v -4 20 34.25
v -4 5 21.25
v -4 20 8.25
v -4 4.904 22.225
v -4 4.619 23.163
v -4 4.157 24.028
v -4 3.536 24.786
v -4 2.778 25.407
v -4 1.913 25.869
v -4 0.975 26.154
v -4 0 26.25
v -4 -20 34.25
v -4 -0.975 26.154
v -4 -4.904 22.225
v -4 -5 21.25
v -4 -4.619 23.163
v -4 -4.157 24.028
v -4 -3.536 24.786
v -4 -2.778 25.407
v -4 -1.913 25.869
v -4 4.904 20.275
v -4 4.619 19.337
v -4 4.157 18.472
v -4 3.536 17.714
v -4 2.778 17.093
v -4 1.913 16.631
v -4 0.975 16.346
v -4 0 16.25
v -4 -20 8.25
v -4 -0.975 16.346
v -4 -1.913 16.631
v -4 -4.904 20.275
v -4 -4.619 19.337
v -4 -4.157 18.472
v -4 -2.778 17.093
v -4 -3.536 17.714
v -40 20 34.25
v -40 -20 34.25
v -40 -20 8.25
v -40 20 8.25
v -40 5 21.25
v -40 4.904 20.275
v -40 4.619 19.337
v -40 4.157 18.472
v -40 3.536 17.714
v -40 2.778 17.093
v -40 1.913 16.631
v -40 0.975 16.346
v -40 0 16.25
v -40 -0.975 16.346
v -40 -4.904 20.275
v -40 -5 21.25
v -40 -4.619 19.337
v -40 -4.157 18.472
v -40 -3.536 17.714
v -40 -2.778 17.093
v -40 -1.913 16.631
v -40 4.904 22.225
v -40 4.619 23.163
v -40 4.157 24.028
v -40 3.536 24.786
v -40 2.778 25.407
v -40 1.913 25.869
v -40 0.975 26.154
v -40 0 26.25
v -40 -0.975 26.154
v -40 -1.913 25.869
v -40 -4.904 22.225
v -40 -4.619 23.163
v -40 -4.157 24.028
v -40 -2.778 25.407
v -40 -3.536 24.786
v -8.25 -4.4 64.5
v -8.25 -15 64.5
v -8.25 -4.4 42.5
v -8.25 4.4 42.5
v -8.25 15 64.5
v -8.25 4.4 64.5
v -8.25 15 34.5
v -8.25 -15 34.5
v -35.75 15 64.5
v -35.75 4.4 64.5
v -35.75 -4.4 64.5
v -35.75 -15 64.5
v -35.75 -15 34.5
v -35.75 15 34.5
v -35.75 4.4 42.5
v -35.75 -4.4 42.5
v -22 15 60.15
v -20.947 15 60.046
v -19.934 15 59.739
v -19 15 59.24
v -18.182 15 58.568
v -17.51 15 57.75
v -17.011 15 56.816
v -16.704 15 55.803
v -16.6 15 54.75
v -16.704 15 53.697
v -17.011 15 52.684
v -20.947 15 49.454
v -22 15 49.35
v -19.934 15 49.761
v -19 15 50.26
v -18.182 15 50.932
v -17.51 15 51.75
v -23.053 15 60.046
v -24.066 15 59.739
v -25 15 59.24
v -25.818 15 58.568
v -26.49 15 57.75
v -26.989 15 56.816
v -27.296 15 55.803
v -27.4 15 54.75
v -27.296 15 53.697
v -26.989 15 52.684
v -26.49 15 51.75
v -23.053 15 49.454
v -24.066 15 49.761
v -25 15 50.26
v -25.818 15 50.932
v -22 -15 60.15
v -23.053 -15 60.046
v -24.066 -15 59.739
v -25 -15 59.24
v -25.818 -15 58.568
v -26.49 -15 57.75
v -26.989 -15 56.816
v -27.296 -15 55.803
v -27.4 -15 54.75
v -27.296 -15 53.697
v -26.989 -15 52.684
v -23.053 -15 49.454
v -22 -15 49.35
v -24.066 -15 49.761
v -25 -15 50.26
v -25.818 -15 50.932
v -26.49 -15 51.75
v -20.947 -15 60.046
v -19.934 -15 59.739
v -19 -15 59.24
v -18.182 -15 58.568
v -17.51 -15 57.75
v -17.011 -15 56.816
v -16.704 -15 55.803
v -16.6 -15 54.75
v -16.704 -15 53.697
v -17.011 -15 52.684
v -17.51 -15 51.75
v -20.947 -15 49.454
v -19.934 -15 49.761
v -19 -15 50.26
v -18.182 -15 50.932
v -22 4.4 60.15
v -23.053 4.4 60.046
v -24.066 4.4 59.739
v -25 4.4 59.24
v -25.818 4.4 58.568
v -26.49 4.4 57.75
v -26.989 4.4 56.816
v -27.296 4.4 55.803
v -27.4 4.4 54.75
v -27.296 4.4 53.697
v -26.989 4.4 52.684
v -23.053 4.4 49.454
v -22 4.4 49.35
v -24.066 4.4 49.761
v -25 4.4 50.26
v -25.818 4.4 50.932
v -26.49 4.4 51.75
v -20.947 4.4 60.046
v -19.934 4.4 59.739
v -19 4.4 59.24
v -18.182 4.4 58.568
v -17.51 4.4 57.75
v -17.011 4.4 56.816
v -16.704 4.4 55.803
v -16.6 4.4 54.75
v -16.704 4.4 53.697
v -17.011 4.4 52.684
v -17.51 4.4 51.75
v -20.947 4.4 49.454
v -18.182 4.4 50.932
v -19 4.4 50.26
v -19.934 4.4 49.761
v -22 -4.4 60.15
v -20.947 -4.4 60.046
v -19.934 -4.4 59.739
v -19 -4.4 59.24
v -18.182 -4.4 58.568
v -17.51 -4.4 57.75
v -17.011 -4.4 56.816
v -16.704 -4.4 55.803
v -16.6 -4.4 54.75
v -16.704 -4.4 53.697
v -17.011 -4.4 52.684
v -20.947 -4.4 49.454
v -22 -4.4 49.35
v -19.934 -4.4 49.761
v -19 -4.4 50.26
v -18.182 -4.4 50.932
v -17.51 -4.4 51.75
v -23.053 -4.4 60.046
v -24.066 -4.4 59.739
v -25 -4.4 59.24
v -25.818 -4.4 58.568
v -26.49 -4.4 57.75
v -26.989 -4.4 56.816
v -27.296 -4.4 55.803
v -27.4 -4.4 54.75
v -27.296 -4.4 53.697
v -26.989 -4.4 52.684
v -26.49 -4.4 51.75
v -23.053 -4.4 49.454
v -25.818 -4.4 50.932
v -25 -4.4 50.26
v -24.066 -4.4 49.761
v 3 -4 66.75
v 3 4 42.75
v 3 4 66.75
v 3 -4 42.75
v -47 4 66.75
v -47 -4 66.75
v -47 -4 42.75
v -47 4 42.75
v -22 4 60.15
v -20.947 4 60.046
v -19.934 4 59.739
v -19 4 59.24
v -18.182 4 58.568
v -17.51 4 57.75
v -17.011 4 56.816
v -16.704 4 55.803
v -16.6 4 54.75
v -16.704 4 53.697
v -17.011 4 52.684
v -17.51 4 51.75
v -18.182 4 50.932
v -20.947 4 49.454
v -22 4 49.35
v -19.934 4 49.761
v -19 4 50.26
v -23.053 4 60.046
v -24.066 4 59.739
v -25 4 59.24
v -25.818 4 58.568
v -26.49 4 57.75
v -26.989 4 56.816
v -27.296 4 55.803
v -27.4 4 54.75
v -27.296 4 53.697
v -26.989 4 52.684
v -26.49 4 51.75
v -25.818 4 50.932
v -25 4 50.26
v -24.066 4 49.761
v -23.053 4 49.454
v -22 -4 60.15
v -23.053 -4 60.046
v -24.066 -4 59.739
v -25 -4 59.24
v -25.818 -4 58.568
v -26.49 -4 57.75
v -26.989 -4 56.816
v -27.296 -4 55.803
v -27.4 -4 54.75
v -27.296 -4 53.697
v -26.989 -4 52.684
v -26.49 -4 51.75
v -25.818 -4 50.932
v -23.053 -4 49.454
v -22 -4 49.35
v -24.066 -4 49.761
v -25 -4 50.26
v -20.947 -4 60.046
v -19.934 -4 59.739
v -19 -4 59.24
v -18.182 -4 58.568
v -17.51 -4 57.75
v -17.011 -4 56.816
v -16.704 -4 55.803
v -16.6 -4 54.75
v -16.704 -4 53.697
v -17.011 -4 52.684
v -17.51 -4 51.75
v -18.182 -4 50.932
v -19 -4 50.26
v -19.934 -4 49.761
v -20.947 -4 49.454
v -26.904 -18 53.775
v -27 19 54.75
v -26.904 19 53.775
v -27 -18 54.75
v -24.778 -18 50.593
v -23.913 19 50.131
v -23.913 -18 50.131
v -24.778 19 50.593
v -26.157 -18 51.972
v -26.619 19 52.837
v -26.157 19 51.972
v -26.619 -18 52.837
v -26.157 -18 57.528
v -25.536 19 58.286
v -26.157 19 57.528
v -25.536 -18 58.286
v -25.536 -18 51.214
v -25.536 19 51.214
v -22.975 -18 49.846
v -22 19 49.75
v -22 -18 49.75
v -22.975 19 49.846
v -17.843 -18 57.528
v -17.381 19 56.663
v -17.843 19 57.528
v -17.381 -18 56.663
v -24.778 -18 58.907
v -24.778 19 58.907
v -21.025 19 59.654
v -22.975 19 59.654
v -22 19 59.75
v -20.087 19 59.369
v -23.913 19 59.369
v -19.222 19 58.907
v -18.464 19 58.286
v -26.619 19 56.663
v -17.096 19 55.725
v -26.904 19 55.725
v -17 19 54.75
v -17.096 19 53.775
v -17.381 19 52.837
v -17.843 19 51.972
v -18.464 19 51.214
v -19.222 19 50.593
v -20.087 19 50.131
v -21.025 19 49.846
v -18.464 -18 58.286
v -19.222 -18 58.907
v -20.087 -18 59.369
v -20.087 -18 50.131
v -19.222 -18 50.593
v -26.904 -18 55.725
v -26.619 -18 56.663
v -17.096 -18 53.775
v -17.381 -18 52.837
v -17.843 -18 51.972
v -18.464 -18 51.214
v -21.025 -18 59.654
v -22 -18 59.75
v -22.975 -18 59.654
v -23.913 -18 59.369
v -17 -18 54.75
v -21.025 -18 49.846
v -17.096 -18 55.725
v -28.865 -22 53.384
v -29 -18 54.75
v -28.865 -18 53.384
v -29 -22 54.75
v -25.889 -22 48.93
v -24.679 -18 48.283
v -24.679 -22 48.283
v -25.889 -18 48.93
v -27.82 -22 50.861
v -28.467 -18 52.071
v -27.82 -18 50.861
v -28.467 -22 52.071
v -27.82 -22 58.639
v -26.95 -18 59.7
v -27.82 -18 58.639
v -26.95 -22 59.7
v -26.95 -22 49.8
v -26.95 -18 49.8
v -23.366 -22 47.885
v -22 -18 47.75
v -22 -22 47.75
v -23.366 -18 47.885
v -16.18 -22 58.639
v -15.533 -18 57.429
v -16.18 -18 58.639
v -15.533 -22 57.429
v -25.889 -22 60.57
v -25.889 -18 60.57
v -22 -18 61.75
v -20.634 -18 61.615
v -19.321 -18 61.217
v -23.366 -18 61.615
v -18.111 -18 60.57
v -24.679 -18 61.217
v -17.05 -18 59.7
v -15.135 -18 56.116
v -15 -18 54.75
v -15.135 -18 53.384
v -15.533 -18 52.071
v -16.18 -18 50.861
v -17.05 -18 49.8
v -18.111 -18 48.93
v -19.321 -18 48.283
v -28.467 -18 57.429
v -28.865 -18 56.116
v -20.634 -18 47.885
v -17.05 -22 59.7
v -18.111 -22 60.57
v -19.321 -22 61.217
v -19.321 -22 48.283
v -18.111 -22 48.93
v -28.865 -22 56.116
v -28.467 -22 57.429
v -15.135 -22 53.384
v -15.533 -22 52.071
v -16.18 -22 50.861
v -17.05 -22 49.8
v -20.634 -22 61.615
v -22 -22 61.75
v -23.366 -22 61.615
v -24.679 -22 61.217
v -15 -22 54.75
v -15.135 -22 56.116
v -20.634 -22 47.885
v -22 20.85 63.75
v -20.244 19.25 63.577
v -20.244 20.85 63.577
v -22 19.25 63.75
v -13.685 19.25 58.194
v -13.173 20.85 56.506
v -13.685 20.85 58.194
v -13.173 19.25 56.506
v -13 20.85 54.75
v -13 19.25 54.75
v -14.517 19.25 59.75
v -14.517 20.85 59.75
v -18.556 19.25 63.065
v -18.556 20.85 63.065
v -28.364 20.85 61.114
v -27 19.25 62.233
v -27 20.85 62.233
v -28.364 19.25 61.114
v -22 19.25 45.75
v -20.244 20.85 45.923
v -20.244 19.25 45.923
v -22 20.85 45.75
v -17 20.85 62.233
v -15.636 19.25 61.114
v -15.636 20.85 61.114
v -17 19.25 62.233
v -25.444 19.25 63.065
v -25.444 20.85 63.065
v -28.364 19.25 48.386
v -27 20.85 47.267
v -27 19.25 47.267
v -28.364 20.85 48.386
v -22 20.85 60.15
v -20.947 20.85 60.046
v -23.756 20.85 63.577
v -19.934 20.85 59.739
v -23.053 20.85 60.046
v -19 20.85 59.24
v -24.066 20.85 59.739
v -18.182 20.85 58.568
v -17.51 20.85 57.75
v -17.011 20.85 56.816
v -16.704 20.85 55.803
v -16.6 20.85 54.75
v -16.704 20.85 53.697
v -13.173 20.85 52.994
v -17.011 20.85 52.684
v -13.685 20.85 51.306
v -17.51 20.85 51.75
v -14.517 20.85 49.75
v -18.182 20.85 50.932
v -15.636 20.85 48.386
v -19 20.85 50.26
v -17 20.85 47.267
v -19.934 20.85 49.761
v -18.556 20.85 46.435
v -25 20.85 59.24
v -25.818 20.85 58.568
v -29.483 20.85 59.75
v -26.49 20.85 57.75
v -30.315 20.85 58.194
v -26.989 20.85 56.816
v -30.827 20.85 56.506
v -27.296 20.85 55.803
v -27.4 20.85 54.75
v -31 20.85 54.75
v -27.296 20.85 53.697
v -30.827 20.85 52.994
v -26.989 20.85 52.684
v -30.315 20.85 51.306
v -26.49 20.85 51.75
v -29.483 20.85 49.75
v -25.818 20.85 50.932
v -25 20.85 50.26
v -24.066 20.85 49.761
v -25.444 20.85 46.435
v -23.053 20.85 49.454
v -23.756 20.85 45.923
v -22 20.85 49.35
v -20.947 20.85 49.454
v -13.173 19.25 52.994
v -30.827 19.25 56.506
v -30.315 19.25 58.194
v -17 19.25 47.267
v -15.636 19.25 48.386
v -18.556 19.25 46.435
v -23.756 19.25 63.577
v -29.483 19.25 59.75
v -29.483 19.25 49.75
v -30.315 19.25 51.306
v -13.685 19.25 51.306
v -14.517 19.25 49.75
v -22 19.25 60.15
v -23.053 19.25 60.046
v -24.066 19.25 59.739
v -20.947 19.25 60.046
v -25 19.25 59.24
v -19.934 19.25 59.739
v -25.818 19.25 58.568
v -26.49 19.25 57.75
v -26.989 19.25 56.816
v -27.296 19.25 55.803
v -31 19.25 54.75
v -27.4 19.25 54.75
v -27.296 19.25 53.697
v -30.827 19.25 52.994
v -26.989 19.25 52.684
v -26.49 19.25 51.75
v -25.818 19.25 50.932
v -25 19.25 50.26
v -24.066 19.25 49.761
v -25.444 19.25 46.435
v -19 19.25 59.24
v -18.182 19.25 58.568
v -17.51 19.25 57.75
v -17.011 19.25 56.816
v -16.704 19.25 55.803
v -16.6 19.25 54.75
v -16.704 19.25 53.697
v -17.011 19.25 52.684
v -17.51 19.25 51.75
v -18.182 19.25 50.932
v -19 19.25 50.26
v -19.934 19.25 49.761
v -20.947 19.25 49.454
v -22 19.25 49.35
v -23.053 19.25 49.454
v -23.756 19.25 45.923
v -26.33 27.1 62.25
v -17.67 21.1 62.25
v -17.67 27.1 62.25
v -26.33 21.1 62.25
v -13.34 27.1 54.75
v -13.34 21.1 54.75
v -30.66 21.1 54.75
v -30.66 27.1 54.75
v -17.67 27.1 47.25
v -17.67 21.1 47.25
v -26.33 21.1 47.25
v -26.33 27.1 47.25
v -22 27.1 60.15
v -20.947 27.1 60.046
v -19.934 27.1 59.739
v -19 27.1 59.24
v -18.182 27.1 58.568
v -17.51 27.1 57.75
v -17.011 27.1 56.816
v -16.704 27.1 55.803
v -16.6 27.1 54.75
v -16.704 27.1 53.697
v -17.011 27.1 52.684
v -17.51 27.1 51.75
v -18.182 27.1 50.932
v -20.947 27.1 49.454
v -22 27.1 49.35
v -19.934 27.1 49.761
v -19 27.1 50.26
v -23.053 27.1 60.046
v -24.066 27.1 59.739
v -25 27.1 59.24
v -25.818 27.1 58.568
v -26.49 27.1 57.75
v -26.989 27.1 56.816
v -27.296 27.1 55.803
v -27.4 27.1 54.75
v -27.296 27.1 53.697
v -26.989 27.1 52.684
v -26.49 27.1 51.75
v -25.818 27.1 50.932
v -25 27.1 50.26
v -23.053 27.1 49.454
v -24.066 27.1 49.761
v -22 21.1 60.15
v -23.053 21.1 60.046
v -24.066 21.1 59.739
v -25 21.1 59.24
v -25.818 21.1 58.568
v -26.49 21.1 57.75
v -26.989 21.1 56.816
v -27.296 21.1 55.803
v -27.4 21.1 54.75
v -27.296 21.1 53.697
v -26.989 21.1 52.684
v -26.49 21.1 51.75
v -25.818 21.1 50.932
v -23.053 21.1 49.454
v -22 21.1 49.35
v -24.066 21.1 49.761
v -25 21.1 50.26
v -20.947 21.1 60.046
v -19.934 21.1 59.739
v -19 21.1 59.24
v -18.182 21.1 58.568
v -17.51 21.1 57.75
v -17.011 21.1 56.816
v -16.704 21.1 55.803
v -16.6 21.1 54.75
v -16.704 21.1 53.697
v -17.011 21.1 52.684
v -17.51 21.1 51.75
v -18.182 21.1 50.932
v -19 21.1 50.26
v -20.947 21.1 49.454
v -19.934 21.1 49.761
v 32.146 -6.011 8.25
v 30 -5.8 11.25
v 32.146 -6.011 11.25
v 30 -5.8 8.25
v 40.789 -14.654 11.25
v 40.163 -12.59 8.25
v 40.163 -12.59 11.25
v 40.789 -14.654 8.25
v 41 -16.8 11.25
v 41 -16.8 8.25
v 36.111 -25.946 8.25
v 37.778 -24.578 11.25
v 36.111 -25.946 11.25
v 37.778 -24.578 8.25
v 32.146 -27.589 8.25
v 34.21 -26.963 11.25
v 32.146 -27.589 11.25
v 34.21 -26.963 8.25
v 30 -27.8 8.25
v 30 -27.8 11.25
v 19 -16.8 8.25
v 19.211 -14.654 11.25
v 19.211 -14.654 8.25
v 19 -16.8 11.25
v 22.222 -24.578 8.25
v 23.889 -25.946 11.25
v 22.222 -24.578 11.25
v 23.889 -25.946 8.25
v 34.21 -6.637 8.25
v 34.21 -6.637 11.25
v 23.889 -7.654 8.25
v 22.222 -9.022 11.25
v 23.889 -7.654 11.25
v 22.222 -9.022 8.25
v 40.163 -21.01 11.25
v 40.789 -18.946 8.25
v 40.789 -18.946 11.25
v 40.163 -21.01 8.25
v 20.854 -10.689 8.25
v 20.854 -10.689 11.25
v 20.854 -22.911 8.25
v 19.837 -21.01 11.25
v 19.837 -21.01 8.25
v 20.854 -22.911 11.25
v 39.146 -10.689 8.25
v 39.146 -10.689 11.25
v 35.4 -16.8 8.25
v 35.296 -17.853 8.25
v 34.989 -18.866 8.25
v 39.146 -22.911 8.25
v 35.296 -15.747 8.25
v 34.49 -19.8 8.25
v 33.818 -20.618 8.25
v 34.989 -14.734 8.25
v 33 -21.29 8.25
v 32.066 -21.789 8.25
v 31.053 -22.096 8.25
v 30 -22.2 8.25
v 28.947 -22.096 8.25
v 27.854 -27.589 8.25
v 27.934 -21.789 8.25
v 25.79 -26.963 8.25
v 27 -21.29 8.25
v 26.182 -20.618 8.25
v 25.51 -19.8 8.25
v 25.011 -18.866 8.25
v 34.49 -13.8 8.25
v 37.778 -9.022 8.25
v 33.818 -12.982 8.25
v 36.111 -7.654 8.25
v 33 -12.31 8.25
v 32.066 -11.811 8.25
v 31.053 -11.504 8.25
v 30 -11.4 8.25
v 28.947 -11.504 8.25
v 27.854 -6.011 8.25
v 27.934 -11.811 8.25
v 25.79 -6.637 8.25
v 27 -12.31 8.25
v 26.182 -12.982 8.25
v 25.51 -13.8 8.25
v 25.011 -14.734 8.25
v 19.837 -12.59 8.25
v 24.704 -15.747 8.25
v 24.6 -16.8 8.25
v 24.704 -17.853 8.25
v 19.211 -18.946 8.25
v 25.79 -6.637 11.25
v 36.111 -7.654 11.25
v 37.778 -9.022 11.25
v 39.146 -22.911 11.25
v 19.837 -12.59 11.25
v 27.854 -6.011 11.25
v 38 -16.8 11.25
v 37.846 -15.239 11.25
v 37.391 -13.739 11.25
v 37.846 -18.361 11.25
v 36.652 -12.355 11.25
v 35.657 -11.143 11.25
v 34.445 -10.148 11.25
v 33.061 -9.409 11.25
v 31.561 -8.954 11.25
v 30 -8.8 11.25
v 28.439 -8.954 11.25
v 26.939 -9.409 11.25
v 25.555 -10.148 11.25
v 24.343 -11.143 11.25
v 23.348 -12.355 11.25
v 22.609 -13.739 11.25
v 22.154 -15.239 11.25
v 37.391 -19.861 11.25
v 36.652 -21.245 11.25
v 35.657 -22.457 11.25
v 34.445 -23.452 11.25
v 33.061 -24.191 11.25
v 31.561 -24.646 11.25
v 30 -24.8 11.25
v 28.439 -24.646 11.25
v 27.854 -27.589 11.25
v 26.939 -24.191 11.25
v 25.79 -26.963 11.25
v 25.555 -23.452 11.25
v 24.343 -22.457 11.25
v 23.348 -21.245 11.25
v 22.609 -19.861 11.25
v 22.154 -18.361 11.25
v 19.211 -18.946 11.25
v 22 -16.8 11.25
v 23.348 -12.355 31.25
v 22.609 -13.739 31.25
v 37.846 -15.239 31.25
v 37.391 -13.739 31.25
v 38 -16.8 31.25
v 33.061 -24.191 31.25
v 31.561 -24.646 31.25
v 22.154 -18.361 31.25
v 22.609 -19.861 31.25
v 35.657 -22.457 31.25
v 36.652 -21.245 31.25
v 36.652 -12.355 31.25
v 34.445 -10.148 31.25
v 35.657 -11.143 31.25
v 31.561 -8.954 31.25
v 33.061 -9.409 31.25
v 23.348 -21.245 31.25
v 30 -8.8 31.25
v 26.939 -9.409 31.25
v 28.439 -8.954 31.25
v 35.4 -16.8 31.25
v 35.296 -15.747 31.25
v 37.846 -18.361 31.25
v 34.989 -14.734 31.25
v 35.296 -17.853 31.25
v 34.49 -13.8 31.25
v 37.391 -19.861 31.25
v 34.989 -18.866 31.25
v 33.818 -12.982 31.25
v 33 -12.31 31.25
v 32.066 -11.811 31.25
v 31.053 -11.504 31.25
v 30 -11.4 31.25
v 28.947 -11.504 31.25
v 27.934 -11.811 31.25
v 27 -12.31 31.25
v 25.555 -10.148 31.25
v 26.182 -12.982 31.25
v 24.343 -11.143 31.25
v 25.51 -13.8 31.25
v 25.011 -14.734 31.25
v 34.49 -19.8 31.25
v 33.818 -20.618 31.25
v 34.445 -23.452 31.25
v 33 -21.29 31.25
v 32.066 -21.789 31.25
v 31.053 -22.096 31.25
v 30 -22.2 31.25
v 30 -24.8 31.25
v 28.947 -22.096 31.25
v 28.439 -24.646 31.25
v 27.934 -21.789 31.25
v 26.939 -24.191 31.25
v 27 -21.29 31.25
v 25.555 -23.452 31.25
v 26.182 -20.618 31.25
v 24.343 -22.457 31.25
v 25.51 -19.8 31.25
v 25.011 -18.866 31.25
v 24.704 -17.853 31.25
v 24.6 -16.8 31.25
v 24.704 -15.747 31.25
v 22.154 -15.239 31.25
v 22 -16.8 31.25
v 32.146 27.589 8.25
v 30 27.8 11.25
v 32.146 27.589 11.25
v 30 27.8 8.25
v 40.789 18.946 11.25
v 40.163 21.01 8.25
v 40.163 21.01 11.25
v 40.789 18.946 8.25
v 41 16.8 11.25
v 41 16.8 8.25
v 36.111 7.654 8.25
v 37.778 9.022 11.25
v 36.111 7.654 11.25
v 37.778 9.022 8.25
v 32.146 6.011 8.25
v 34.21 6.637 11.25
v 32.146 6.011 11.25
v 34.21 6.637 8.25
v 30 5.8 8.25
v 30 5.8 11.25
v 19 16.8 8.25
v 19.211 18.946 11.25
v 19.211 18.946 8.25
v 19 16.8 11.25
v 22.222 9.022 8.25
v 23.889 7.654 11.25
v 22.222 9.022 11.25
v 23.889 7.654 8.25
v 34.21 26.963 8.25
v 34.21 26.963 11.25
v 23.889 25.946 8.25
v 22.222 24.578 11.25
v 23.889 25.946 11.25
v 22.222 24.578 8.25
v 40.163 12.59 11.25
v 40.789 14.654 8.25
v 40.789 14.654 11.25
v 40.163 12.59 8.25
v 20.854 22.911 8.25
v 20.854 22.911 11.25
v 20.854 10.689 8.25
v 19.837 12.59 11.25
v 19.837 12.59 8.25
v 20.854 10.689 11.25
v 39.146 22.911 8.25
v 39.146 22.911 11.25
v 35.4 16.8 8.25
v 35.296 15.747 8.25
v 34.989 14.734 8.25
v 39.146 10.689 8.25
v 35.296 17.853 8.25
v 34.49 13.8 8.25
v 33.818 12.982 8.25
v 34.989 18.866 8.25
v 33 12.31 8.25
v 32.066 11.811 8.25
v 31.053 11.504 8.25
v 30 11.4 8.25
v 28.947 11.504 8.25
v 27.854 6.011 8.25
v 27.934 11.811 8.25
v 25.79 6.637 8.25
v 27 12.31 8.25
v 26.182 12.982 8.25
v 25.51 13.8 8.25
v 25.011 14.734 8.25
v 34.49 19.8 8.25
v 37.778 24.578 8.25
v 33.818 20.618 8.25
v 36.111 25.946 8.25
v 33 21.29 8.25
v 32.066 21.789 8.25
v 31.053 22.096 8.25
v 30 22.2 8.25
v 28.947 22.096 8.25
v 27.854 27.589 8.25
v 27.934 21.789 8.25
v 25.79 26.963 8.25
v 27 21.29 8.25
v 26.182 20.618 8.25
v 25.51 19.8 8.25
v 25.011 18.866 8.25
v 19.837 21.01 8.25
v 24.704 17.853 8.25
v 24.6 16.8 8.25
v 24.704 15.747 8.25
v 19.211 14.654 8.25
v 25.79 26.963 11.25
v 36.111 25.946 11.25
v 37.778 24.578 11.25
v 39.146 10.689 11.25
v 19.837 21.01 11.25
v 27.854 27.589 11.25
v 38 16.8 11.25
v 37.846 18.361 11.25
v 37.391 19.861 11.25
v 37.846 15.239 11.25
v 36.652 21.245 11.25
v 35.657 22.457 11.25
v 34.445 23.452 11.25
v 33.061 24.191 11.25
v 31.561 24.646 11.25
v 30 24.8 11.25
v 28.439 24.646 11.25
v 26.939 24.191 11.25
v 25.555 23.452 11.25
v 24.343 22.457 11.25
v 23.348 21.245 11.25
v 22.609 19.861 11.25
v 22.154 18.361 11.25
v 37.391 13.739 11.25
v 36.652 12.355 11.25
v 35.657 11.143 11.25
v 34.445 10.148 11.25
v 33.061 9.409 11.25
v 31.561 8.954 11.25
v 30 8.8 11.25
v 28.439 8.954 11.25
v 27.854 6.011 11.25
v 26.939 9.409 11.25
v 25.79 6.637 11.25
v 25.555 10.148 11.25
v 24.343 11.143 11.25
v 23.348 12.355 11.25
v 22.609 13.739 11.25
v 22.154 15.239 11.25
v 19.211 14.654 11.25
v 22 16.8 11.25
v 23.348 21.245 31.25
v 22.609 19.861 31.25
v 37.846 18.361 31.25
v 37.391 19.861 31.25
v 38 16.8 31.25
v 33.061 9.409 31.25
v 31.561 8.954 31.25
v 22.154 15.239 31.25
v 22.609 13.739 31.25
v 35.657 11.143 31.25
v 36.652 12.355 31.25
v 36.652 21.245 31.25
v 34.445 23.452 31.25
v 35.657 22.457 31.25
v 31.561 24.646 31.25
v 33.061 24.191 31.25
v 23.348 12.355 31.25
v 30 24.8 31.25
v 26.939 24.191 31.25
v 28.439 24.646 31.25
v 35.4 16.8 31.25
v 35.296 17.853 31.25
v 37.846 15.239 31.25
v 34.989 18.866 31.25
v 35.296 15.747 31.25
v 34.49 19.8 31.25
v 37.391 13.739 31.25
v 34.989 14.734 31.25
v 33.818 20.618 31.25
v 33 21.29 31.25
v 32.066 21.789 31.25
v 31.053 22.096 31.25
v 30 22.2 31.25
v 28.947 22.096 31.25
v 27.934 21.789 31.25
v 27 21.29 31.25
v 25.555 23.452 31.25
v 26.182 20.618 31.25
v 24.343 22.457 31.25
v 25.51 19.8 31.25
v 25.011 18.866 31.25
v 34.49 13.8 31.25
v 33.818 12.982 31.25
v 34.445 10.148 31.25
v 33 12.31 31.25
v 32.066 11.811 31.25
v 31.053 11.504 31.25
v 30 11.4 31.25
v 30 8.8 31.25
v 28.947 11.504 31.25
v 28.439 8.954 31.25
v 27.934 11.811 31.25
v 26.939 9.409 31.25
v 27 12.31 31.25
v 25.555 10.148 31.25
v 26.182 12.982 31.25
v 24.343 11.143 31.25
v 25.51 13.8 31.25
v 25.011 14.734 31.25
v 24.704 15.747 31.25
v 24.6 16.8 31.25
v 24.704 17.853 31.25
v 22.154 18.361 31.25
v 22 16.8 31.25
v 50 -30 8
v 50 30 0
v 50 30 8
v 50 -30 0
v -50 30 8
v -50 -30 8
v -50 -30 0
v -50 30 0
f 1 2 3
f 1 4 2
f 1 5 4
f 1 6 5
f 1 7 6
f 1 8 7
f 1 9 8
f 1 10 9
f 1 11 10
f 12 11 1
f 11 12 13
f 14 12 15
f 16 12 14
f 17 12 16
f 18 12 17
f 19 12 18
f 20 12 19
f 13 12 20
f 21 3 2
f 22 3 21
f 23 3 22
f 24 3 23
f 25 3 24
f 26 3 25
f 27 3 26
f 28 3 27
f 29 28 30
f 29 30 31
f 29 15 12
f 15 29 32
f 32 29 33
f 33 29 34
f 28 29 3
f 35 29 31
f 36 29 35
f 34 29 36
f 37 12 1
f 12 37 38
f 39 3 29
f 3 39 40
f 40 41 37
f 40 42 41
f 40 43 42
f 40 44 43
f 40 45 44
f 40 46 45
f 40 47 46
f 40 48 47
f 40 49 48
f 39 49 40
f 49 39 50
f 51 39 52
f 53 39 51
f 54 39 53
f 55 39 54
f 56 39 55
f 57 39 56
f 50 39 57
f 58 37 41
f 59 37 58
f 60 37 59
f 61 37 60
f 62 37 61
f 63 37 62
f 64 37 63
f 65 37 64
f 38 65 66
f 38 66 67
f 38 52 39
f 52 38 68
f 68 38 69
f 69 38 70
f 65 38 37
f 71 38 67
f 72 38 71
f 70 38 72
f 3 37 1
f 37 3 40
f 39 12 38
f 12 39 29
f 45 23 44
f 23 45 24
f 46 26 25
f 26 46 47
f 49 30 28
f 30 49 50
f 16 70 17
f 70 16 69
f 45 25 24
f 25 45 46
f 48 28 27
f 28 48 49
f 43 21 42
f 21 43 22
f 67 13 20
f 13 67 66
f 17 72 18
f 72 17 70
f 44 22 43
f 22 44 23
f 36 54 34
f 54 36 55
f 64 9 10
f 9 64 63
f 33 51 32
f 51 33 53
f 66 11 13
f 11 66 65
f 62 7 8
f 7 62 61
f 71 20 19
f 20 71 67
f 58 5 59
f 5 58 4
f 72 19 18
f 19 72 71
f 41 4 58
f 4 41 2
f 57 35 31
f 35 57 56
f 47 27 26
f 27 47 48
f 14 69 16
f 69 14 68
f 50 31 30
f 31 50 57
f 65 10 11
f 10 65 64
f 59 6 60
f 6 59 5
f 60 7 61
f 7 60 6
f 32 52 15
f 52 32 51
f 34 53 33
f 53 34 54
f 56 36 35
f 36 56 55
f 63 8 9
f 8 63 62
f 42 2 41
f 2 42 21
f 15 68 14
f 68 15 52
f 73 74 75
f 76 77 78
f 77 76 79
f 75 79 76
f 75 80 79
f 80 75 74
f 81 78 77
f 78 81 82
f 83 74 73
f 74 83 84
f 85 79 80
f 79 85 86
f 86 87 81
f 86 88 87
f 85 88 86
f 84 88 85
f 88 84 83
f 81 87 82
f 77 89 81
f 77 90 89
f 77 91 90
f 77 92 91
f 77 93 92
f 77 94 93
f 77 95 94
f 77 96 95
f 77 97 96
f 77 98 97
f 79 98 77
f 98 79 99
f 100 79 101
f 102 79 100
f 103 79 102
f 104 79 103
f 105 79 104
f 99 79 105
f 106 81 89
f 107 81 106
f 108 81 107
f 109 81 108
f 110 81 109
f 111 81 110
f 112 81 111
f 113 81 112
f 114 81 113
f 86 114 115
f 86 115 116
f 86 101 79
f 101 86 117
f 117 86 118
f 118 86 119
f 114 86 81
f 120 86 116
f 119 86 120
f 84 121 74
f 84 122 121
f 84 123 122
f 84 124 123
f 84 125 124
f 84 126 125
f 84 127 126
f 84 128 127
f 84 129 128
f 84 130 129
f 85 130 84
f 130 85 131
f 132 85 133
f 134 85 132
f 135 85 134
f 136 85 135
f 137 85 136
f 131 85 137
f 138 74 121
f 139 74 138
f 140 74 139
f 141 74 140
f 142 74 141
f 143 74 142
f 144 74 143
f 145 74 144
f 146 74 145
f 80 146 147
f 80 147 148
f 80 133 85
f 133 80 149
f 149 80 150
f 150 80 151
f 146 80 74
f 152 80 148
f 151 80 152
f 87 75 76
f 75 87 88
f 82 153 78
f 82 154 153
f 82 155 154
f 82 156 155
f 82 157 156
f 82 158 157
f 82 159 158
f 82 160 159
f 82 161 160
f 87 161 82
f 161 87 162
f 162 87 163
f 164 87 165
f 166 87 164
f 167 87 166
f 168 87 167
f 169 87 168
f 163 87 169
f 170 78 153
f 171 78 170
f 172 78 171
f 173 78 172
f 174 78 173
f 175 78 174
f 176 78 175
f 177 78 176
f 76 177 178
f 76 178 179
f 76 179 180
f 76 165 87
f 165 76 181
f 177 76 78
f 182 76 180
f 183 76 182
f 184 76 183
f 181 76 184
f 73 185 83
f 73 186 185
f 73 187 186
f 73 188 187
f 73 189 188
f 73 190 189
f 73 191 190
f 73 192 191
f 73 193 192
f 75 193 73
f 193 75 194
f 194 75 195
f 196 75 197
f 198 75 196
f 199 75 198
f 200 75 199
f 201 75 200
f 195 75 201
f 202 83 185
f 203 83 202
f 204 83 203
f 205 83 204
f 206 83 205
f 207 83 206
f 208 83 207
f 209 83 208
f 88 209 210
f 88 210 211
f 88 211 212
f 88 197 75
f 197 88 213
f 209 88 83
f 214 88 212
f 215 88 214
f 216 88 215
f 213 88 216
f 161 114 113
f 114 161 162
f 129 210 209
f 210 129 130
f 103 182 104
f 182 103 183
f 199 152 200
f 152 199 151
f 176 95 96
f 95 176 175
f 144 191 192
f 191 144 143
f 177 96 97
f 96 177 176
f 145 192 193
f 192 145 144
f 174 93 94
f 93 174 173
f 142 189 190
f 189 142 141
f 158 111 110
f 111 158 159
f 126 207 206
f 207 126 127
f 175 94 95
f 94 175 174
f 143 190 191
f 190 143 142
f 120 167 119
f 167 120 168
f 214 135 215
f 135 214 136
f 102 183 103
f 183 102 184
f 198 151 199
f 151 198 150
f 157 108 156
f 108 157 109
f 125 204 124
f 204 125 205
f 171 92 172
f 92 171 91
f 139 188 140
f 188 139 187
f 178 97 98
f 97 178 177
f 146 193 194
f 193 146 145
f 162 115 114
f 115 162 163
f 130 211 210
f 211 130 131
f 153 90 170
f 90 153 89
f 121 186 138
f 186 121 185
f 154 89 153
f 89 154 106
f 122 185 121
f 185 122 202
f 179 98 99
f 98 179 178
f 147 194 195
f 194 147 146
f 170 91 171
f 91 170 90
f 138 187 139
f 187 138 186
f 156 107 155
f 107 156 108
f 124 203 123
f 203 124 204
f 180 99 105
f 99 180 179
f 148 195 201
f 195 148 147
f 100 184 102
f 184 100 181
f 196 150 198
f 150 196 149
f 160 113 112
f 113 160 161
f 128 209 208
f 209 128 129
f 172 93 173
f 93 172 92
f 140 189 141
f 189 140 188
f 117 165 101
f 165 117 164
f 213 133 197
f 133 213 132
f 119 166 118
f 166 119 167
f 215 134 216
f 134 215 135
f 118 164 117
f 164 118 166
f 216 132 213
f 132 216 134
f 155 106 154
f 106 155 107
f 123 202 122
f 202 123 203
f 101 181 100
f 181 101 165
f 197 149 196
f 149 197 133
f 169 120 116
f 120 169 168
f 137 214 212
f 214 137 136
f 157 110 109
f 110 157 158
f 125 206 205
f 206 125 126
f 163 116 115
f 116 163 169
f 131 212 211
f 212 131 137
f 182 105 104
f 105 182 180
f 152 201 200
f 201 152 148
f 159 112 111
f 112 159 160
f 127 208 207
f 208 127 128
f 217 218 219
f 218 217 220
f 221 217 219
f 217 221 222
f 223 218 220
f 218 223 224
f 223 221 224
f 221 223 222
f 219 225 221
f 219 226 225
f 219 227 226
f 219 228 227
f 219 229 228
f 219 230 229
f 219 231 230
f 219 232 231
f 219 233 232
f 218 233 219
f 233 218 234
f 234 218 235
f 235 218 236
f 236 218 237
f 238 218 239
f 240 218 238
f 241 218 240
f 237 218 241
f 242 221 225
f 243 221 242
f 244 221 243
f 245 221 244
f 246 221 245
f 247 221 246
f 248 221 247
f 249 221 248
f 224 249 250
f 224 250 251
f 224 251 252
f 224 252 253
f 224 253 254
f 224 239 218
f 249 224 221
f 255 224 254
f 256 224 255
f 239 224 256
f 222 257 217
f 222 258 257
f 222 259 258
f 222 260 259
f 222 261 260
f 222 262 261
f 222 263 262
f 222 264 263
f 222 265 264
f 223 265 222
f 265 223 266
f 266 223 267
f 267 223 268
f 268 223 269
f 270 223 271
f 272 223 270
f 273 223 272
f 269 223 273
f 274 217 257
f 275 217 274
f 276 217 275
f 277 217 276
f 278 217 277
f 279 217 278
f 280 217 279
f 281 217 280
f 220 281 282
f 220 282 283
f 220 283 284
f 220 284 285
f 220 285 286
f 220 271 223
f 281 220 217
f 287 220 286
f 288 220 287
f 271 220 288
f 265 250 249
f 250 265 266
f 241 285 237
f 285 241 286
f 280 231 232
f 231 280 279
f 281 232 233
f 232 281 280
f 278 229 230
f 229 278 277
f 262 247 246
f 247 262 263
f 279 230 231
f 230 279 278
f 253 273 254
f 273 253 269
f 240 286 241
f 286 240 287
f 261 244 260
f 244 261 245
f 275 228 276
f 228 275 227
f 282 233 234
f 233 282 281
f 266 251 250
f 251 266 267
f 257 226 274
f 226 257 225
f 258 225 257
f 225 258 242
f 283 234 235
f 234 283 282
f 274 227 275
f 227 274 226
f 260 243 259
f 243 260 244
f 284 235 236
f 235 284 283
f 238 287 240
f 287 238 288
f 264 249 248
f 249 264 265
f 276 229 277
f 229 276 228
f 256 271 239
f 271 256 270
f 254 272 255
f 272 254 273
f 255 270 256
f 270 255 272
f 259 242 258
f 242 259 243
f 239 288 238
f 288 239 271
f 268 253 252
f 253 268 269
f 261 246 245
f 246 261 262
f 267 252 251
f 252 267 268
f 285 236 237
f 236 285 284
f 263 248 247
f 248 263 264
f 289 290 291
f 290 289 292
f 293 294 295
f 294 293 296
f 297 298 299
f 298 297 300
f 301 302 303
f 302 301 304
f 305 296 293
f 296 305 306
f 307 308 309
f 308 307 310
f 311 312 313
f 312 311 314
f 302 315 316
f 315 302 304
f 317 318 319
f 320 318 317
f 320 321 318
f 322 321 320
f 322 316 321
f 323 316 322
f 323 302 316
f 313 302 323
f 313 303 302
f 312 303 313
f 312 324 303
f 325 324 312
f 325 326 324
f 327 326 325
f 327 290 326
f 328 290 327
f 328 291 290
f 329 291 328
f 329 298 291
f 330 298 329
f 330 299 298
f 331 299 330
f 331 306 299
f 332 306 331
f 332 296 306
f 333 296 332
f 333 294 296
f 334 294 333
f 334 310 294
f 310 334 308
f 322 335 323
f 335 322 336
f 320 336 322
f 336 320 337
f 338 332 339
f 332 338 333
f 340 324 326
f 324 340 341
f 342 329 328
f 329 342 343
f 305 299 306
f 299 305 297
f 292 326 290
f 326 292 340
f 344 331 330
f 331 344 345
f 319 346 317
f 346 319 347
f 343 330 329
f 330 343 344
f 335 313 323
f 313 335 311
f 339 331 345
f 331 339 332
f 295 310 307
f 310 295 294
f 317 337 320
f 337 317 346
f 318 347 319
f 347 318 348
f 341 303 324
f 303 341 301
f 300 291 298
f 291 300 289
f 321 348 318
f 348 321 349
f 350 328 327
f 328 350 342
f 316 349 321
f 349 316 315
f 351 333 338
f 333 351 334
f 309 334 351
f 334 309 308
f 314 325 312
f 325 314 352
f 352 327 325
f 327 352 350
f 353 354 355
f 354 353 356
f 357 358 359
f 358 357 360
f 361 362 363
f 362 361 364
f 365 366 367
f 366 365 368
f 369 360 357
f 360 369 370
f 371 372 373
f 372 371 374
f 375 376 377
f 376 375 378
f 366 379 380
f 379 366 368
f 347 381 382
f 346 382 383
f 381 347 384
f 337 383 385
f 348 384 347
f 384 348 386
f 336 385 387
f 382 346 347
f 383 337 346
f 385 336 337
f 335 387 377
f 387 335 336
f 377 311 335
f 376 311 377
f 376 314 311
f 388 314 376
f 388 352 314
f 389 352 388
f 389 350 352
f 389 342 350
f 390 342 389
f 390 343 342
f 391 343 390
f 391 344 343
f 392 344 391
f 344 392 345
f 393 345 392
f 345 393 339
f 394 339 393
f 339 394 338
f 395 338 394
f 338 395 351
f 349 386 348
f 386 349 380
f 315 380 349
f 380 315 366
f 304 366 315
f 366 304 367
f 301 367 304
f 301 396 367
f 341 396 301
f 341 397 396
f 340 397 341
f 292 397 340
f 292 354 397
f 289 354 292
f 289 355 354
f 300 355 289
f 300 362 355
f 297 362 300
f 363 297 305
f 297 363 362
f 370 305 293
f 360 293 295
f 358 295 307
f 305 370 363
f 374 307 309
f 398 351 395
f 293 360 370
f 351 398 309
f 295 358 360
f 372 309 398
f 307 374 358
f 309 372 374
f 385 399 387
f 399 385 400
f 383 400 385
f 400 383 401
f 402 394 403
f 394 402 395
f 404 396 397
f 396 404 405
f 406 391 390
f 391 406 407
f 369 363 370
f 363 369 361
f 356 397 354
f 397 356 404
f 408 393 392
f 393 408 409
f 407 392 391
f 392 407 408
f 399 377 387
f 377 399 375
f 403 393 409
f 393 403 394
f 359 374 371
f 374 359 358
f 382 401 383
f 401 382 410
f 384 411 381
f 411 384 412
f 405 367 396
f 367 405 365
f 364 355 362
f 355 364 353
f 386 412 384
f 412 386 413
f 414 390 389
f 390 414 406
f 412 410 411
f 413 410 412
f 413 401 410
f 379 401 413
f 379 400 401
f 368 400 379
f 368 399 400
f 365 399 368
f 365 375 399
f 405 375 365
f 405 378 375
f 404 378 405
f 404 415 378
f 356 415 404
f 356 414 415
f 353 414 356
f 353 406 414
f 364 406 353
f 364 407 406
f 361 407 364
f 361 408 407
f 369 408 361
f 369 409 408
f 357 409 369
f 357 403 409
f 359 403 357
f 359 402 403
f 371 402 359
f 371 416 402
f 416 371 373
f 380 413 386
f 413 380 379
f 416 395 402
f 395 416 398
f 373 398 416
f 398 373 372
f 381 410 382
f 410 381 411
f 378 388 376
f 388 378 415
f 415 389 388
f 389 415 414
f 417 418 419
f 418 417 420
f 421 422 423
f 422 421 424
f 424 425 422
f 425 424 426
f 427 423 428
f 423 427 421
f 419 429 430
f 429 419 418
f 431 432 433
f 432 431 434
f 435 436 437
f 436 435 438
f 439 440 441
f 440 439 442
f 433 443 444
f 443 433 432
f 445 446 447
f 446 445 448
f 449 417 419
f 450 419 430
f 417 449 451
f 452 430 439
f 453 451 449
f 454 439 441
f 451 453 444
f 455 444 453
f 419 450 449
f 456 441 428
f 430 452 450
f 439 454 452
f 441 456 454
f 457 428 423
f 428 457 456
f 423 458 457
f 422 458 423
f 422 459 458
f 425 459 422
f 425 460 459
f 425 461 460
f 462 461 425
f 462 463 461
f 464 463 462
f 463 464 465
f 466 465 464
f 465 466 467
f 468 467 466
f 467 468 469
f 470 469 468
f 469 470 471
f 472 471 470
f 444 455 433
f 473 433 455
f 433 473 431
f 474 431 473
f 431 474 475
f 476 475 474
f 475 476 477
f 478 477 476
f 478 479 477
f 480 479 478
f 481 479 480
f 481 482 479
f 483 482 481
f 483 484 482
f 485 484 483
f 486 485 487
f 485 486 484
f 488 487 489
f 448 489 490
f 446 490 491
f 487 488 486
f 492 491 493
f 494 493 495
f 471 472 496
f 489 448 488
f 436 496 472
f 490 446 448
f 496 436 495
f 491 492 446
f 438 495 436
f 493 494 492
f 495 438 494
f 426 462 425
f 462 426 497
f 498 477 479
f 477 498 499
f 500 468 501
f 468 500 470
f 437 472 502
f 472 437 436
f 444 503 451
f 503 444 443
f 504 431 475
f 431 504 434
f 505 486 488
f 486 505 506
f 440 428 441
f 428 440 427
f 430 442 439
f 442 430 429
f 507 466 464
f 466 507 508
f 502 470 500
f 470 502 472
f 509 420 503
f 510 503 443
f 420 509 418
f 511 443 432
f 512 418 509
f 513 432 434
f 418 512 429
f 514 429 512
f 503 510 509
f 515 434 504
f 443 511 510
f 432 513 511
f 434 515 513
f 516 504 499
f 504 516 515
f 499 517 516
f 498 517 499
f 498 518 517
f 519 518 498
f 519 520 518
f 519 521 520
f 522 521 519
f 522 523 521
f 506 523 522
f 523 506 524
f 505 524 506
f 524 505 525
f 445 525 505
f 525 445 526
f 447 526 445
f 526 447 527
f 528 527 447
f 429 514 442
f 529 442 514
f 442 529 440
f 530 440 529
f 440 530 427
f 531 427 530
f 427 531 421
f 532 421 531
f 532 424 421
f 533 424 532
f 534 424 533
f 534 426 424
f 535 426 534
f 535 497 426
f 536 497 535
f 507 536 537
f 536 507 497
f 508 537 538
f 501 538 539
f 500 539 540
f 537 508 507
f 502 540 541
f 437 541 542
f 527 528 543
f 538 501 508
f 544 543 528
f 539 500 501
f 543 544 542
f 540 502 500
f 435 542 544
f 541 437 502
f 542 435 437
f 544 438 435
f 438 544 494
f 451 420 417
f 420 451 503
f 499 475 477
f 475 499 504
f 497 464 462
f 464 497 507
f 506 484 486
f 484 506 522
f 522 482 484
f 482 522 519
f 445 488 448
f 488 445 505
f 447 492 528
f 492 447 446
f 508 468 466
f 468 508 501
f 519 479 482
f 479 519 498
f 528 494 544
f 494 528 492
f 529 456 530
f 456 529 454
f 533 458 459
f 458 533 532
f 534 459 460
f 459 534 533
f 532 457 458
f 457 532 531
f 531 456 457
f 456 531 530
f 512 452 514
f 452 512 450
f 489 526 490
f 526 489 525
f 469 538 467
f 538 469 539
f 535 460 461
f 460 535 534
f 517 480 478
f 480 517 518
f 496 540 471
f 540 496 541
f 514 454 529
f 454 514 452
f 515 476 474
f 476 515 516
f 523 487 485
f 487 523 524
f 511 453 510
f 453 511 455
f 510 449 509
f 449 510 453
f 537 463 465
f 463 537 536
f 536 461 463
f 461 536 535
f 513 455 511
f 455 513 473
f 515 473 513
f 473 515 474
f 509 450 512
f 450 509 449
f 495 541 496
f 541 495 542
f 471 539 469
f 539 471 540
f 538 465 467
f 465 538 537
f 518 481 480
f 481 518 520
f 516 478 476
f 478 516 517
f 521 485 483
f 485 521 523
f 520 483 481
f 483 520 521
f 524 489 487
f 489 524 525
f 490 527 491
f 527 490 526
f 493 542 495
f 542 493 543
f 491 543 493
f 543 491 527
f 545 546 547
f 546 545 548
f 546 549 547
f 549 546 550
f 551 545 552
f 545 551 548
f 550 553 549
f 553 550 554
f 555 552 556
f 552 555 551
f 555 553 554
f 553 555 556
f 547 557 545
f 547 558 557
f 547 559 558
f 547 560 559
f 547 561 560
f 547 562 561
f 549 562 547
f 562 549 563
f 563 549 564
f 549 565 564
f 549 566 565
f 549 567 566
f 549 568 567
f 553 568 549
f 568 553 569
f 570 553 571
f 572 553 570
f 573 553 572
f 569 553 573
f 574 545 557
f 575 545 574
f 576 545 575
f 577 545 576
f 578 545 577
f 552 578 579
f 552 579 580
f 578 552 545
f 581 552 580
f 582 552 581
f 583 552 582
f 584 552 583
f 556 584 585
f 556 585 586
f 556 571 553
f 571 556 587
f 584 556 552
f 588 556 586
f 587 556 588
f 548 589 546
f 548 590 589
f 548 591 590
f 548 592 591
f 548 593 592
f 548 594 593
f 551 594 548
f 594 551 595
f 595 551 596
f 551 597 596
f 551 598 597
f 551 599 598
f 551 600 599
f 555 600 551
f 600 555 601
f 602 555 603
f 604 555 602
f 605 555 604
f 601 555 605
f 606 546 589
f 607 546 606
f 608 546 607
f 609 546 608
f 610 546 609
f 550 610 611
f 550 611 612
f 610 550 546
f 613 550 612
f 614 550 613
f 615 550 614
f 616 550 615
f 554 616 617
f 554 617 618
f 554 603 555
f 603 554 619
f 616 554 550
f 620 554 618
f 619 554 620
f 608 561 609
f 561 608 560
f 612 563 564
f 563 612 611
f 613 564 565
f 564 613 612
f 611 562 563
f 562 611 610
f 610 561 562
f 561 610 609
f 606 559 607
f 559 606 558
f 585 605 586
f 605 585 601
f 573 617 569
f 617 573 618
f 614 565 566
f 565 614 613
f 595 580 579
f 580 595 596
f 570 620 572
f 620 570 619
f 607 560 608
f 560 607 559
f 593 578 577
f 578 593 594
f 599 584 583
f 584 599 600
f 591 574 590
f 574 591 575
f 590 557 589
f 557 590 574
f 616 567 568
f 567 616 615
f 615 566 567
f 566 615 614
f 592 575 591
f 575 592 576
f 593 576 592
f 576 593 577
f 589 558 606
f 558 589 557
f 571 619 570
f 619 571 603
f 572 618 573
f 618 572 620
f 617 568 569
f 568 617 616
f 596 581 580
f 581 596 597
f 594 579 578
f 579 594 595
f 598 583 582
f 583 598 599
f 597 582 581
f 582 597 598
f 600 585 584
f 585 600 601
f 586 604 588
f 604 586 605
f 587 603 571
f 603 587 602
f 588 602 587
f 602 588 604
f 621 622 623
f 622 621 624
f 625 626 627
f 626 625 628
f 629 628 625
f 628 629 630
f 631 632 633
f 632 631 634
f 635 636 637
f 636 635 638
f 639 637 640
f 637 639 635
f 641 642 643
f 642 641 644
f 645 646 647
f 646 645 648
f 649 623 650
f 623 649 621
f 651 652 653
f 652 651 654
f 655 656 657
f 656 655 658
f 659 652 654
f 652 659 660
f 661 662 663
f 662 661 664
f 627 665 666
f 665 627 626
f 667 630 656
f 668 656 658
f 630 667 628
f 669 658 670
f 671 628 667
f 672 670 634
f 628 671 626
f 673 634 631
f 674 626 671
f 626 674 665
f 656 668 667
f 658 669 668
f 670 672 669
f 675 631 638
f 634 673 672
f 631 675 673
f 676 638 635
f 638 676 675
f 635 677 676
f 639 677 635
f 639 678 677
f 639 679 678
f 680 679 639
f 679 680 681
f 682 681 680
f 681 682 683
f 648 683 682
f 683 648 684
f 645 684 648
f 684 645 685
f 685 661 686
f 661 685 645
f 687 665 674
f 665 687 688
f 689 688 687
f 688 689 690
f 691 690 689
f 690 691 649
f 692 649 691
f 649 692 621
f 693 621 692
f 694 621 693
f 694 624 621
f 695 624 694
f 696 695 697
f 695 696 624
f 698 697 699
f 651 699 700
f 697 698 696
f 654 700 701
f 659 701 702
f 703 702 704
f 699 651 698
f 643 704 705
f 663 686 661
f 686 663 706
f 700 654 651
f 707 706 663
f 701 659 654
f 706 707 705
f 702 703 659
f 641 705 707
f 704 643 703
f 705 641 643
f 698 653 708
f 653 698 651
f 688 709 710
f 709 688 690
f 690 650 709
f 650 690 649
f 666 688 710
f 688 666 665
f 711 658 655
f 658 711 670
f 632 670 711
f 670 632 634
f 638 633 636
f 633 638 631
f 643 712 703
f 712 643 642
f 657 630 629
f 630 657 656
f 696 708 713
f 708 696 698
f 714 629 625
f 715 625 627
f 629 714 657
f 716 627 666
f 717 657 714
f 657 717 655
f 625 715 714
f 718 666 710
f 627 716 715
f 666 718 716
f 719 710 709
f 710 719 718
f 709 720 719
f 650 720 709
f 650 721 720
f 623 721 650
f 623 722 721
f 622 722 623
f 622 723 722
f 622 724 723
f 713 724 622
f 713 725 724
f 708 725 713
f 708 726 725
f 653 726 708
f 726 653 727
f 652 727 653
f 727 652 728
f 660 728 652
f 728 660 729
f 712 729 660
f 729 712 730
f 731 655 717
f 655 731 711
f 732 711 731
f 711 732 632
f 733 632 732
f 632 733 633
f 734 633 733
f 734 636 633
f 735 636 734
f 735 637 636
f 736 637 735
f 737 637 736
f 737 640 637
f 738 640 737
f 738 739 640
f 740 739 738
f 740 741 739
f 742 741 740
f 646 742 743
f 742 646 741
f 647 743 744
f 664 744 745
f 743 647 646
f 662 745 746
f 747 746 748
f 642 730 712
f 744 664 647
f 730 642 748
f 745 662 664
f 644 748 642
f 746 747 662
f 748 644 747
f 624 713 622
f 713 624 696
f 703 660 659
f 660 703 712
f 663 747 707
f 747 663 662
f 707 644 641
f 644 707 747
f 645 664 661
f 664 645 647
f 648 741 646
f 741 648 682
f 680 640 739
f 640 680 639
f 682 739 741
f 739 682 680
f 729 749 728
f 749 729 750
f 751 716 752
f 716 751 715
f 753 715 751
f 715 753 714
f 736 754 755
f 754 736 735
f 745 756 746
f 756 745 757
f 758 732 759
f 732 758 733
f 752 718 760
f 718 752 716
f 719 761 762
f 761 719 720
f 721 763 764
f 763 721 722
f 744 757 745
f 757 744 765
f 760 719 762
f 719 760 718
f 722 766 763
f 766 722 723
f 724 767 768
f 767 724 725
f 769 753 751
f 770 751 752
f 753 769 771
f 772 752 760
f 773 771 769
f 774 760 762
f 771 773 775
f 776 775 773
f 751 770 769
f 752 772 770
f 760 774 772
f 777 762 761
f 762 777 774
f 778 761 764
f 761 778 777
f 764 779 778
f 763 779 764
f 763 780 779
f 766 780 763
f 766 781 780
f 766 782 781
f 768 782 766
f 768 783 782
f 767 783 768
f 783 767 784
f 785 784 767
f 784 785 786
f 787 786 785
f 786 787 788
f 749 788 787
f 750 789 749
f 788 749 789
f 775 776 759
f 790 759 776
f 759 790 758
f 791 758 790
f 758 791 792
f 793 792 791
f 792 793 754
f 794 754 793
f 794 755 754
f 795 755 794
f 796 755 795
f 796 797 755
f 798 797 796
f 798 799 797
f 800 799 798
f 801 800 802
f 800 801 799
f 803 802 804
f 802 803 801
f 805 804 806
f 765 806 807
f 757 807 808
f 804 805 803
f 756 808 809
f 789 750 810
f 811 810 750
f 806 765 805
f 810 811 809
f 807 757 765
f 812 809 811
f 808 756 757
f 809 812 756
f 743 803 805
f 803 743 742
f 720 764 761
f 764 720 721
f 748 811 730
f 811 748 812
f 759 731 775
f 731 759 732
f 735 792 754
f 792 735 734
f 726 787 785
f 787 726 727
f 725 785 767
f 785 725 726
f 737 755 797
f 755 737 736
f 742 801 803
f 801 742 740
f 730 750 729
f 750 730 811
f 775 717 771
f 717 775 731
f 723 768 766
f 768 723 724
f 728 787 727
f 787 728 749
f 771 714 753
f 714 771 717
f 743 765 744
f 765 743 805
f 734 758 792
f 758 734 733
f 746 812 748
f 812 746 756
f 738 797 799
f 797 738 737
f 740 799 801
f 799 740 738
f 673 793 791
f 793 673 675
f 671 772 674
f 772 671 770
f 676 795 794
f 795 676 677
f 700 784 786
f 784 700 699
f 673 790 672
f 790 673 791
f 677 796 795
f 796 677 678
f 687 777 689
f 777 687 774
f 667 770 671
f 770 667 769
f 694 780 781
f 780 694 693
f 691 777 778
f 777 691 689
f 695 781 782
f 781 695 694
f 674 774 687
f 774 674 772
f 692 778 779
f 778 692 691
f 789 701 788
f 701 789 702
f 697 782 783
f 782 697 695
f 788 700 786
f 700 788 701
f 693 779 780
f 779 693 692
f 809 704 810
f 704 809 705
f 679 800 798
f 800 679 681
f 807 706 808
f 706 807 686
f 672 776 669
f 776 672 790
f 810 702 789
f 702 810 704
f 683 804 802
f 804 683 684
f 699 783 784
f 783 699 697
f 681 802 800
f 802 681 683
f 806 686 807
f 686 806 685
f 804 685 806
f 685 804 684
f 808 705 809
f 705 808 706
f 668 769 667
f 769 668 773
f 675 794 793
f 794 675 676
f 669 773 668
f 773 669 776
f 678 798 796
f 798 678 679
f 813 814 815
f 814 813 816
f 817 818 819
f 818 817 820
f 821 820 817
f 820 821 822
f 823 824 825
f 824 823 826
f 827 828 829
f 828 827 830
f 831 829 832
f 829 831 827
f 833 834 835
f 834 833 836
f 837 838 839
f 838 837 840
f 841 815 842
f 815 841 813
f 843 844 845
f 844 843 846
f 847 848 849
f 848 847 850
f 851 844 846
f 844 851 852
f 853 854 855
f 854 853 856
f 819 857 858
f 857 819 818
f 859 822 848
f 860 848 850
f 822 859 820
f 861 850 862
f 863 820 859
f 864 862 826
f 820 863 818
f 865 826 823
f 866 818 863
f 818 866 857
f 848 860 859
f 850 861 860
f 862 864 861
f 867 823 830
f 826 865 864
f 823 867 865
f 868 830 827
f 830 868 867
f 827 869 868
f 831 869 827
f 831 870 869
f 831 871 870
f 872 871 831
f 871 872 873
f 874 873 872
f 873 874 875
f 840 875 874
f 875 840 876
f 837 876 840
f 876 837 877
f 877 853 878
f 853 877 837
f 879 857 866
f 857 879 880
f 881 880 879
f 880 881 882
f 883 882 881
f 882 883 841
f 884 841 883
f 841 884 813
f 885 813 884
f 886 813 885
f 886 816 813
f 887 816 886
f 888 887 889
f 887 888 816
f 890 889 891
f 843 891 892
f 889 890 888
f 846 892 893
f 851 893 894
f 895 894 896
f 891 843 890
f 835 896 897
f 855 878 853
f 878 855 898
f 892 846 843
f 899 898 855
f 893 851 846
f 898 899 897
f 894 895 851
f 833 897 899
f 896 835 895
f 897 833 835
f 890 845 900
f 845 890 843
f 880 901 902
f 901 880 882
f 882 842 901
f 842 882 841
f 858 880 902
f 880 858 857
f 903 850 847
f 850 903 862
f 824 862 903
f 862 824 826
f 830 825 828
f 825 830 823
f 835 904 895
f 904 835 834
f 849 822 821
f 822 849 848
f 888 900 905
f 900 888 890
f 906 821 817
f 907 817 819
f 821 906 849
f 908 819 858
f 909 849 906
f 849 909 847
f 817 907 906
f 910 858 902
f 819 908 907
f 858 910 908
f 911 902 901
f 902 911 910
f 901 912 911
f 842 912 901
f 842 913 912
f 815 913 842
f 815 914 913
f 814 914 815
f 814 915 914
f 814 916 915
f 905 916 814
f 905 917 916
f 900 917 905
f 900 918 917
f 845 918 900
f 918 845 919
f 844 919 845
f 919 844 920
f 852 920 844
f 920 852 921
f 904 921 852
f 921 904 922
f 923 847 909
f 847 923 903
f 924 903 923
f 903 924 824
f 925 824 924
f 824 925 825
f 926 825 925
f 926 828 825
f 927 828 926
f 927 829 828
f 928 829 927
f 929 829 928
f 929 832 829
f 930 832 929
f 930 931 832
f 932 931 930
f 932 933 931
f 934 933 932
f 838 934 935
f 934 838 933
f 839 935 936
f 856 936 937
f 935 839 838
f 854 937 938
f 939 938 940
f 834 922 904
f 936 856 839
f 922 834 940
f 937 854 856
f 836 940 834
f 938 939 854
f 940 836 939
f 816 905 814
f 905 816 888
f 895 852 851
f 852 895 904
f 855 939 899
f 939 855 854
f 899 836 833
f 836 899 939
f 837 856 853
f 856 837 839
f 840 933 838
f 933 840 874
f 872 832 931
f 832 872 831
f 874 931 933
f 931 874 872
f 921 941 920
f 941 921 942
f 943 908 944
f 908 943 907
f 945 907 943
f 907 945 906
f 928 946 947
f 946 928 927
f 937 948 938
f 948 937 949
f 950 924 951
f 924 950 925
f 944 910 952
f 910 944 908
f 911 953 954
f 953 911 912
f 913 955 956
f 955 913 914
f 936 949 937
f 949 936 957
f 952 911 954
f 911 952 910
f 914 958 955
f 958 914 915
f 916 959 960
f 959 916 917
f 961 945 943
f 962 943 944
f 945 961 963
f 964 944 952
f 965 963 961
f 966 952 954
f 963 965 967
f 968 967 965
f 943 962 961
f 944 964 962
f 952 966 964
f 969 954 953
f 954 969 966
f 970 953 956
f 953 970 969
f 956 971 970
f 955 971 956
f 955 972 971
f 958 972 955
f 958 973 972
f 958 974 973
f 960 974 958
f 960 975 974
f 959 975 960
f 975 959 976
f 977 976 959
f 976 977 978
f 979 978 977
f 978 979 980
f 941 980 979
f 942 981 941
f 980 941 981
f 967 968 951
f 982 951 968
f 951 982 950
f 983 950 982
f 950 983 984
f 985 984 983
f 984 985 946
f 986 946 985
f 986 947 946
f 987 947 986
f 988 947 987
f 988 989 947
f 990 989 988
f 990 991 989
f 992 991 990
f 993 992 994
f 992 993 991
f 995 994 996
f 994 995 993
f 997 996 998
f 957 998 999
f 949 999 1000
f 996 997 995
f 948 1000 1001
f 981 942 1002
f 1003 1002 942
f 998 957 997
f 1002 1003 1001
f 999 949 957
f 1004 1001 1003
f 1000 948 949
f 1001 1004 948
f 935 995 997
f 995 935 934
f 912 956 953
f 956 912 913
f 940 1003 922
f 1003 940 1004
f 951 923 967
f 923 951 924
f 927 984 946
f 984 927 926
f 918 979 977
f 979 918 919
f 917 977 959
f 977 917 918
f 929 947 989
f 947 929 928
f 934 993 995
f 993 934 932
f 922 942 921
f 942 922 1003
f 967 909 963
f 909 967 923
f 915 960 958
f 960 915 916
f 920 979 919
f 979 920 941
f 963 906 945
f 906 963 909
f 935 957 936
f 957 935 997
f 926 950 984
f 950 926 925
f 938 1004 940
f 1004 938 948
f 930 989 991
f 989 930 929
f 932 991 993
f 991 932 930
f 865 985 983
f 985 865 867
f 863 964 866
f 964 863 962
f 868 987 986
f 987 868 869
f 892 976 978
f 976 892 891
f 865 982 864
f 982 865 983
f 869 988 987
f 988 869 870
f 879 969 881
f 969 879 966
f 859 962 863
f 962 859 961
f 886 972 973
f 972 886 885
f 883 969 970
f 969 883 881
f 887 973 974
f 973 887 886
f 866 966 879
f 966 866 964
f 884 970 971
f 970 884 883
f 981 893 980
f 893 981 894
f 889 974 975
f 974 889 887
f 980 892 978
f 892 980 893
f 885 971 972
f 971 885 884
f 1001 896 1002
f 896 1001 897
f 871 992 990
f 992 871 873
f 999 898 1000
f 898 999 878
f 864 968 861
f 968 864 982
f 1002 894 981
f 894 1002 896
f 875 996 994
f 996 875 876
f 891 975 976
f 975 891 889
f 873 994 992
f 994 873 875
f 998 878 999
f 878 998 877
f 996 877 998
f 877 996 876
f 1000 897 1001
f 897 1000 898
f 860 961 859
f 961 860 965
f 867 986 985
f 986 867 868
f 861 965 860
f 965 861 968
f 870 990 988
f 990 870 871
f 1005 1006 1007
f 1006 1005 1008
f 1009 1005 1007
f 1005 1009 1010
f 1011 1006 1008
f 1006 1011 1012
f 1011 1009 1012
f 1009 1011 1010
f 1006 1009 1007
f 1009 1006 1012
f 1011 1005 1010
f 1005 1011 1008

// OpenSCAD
$fn = 32;

// ------------------------------------------------------------------------
// Indexing jig: plate 100 x 60 mm, pin d10
// Every part is its own module, assembly() places every instance.
// ------------------------------------------------------------------------

// --- part 1 ---
module jig_plate() {
  difference() {
    translate([-50, -30, 0]) cube([100, 60, 8]);
  }
}

// --- part 2 ---
module locator_block() {
  difference() {
    translate([-18, -20, 0]) cube([36, 40, 26]);
    translate([0, 0, 13]) rotate([0, 90, 0]) cylinder(h = 38, d = 10, center = true);
  }
}

// --- part 3 ---
module index_fork() {
  difference() {
    translate([-13.75, -15, 0]) cube([27.5, 30, 30]);
    translate([-14.75, -4.4, 8]) cube([29.5, 8.8, 23]);
    translate([0, 0, 20.25]) rotate([90, 0, 0]) cylinder(h = 32, d = 10.8, center = true);
  }
}

// --- part 4 ---
module index_arm() {
  difference() {
    translate([-25, -4, 0]) cube([50, 8, 24]);
    translate([0, 0, 12]) rotate([90, 0, 0]) cylinder(h = 10, d = 10.8, center = true);
  }
}

// --- part 5 ---
module index_pin() {
  rotate([0, 90, 0]) cylinder(h = 38, d = 10, center = true);
  translate([-22, 0, 0]) rotate([0, 90, 0]) cylinder(h = 4, d = 14);
}

// --- part 6 ---
module pin_washer() {
  difference() {
      translate([0, 0, 0]) cylinder(h = 1.6, d = 18);
      translate([0, 0, -1]) cylinder(h = 3.6, d = 10.8);
    }
}

// --- part 7 ---
module lock_nut() {
  difference() {
    linear_extrude(height = 6) polygon(points = [[8.66, 0], [4.33, 7.5], [-4.33, 7.5], [-8.66, 0], [-4.33, -7.5], [4.33, -7.5]]);
    translate([0, 0, -1]) cylinder(h = 8, d = 10.8);
  }
}

// --- part 8 ---
module guide_bush_a() {
  difference() {
    union() {
      cylinder(h = 3, d = 22);
      translate([0, 0, 3]) cylinder(h = 20, d = 16);
    }
    translate([0, 0, -1]) cylinder(h = 25, d = 10.8);
  }
}

// --- part 9 ---
module guide_bush_b() {
  difference() {
    union() {
      cylinder(h = 3, d = 22);
      translate([0, 0, 3]) cylinder(h = 20, d = 16);
    }
    translate([0, 0, -1]) cylinder(h = 25, d = 10.8);
  }
}

// --- assembly ---
module assembly() {
  color([0.80, 0.24, 0.20]) translate([0, 0, 0]) rotate([0, 0, 0]) jig_plate();
  color([0.20, 0.45, 0.75]) translate([-22, 0, 8.25]) rotate([0, 0, 0]) locator_block();
  color([0.25, 0.62, 0.32]) translate([-22, 0, 34.5]) rotate([0, 0, 0]) index_fork();
  color([0.92, 0.70, 0.18]) translate([-22, 0, 42.75]) rotate([0, 0, 0]) index_arm();
  color([0.58, 0.35, 0.70]) translate([-22, 0, 54.75]) rotate([0, 0, 90]) index_pin();
  color([0.16, 0.66, 0.66]) translate([-22, 20.85, 54.75]) rotate([90, 0, 0]) pin_washer();
  color([0.85, 0.48, 0.18]) translate([-22, 27.1, 54.75]) rotate([90, 0, 0]) lock_nut();
  color([0.55, 0.60, 0.65]) translate([30, -16.8, 8.25]) rotate([0, 0, 0]) guide_bush_a();
  color([0.75, 0.30, 0.55]) translate([30, 16.8, 8.25]) rotate([0, 0, 0]) guide_bush_b();
}

assembly();
